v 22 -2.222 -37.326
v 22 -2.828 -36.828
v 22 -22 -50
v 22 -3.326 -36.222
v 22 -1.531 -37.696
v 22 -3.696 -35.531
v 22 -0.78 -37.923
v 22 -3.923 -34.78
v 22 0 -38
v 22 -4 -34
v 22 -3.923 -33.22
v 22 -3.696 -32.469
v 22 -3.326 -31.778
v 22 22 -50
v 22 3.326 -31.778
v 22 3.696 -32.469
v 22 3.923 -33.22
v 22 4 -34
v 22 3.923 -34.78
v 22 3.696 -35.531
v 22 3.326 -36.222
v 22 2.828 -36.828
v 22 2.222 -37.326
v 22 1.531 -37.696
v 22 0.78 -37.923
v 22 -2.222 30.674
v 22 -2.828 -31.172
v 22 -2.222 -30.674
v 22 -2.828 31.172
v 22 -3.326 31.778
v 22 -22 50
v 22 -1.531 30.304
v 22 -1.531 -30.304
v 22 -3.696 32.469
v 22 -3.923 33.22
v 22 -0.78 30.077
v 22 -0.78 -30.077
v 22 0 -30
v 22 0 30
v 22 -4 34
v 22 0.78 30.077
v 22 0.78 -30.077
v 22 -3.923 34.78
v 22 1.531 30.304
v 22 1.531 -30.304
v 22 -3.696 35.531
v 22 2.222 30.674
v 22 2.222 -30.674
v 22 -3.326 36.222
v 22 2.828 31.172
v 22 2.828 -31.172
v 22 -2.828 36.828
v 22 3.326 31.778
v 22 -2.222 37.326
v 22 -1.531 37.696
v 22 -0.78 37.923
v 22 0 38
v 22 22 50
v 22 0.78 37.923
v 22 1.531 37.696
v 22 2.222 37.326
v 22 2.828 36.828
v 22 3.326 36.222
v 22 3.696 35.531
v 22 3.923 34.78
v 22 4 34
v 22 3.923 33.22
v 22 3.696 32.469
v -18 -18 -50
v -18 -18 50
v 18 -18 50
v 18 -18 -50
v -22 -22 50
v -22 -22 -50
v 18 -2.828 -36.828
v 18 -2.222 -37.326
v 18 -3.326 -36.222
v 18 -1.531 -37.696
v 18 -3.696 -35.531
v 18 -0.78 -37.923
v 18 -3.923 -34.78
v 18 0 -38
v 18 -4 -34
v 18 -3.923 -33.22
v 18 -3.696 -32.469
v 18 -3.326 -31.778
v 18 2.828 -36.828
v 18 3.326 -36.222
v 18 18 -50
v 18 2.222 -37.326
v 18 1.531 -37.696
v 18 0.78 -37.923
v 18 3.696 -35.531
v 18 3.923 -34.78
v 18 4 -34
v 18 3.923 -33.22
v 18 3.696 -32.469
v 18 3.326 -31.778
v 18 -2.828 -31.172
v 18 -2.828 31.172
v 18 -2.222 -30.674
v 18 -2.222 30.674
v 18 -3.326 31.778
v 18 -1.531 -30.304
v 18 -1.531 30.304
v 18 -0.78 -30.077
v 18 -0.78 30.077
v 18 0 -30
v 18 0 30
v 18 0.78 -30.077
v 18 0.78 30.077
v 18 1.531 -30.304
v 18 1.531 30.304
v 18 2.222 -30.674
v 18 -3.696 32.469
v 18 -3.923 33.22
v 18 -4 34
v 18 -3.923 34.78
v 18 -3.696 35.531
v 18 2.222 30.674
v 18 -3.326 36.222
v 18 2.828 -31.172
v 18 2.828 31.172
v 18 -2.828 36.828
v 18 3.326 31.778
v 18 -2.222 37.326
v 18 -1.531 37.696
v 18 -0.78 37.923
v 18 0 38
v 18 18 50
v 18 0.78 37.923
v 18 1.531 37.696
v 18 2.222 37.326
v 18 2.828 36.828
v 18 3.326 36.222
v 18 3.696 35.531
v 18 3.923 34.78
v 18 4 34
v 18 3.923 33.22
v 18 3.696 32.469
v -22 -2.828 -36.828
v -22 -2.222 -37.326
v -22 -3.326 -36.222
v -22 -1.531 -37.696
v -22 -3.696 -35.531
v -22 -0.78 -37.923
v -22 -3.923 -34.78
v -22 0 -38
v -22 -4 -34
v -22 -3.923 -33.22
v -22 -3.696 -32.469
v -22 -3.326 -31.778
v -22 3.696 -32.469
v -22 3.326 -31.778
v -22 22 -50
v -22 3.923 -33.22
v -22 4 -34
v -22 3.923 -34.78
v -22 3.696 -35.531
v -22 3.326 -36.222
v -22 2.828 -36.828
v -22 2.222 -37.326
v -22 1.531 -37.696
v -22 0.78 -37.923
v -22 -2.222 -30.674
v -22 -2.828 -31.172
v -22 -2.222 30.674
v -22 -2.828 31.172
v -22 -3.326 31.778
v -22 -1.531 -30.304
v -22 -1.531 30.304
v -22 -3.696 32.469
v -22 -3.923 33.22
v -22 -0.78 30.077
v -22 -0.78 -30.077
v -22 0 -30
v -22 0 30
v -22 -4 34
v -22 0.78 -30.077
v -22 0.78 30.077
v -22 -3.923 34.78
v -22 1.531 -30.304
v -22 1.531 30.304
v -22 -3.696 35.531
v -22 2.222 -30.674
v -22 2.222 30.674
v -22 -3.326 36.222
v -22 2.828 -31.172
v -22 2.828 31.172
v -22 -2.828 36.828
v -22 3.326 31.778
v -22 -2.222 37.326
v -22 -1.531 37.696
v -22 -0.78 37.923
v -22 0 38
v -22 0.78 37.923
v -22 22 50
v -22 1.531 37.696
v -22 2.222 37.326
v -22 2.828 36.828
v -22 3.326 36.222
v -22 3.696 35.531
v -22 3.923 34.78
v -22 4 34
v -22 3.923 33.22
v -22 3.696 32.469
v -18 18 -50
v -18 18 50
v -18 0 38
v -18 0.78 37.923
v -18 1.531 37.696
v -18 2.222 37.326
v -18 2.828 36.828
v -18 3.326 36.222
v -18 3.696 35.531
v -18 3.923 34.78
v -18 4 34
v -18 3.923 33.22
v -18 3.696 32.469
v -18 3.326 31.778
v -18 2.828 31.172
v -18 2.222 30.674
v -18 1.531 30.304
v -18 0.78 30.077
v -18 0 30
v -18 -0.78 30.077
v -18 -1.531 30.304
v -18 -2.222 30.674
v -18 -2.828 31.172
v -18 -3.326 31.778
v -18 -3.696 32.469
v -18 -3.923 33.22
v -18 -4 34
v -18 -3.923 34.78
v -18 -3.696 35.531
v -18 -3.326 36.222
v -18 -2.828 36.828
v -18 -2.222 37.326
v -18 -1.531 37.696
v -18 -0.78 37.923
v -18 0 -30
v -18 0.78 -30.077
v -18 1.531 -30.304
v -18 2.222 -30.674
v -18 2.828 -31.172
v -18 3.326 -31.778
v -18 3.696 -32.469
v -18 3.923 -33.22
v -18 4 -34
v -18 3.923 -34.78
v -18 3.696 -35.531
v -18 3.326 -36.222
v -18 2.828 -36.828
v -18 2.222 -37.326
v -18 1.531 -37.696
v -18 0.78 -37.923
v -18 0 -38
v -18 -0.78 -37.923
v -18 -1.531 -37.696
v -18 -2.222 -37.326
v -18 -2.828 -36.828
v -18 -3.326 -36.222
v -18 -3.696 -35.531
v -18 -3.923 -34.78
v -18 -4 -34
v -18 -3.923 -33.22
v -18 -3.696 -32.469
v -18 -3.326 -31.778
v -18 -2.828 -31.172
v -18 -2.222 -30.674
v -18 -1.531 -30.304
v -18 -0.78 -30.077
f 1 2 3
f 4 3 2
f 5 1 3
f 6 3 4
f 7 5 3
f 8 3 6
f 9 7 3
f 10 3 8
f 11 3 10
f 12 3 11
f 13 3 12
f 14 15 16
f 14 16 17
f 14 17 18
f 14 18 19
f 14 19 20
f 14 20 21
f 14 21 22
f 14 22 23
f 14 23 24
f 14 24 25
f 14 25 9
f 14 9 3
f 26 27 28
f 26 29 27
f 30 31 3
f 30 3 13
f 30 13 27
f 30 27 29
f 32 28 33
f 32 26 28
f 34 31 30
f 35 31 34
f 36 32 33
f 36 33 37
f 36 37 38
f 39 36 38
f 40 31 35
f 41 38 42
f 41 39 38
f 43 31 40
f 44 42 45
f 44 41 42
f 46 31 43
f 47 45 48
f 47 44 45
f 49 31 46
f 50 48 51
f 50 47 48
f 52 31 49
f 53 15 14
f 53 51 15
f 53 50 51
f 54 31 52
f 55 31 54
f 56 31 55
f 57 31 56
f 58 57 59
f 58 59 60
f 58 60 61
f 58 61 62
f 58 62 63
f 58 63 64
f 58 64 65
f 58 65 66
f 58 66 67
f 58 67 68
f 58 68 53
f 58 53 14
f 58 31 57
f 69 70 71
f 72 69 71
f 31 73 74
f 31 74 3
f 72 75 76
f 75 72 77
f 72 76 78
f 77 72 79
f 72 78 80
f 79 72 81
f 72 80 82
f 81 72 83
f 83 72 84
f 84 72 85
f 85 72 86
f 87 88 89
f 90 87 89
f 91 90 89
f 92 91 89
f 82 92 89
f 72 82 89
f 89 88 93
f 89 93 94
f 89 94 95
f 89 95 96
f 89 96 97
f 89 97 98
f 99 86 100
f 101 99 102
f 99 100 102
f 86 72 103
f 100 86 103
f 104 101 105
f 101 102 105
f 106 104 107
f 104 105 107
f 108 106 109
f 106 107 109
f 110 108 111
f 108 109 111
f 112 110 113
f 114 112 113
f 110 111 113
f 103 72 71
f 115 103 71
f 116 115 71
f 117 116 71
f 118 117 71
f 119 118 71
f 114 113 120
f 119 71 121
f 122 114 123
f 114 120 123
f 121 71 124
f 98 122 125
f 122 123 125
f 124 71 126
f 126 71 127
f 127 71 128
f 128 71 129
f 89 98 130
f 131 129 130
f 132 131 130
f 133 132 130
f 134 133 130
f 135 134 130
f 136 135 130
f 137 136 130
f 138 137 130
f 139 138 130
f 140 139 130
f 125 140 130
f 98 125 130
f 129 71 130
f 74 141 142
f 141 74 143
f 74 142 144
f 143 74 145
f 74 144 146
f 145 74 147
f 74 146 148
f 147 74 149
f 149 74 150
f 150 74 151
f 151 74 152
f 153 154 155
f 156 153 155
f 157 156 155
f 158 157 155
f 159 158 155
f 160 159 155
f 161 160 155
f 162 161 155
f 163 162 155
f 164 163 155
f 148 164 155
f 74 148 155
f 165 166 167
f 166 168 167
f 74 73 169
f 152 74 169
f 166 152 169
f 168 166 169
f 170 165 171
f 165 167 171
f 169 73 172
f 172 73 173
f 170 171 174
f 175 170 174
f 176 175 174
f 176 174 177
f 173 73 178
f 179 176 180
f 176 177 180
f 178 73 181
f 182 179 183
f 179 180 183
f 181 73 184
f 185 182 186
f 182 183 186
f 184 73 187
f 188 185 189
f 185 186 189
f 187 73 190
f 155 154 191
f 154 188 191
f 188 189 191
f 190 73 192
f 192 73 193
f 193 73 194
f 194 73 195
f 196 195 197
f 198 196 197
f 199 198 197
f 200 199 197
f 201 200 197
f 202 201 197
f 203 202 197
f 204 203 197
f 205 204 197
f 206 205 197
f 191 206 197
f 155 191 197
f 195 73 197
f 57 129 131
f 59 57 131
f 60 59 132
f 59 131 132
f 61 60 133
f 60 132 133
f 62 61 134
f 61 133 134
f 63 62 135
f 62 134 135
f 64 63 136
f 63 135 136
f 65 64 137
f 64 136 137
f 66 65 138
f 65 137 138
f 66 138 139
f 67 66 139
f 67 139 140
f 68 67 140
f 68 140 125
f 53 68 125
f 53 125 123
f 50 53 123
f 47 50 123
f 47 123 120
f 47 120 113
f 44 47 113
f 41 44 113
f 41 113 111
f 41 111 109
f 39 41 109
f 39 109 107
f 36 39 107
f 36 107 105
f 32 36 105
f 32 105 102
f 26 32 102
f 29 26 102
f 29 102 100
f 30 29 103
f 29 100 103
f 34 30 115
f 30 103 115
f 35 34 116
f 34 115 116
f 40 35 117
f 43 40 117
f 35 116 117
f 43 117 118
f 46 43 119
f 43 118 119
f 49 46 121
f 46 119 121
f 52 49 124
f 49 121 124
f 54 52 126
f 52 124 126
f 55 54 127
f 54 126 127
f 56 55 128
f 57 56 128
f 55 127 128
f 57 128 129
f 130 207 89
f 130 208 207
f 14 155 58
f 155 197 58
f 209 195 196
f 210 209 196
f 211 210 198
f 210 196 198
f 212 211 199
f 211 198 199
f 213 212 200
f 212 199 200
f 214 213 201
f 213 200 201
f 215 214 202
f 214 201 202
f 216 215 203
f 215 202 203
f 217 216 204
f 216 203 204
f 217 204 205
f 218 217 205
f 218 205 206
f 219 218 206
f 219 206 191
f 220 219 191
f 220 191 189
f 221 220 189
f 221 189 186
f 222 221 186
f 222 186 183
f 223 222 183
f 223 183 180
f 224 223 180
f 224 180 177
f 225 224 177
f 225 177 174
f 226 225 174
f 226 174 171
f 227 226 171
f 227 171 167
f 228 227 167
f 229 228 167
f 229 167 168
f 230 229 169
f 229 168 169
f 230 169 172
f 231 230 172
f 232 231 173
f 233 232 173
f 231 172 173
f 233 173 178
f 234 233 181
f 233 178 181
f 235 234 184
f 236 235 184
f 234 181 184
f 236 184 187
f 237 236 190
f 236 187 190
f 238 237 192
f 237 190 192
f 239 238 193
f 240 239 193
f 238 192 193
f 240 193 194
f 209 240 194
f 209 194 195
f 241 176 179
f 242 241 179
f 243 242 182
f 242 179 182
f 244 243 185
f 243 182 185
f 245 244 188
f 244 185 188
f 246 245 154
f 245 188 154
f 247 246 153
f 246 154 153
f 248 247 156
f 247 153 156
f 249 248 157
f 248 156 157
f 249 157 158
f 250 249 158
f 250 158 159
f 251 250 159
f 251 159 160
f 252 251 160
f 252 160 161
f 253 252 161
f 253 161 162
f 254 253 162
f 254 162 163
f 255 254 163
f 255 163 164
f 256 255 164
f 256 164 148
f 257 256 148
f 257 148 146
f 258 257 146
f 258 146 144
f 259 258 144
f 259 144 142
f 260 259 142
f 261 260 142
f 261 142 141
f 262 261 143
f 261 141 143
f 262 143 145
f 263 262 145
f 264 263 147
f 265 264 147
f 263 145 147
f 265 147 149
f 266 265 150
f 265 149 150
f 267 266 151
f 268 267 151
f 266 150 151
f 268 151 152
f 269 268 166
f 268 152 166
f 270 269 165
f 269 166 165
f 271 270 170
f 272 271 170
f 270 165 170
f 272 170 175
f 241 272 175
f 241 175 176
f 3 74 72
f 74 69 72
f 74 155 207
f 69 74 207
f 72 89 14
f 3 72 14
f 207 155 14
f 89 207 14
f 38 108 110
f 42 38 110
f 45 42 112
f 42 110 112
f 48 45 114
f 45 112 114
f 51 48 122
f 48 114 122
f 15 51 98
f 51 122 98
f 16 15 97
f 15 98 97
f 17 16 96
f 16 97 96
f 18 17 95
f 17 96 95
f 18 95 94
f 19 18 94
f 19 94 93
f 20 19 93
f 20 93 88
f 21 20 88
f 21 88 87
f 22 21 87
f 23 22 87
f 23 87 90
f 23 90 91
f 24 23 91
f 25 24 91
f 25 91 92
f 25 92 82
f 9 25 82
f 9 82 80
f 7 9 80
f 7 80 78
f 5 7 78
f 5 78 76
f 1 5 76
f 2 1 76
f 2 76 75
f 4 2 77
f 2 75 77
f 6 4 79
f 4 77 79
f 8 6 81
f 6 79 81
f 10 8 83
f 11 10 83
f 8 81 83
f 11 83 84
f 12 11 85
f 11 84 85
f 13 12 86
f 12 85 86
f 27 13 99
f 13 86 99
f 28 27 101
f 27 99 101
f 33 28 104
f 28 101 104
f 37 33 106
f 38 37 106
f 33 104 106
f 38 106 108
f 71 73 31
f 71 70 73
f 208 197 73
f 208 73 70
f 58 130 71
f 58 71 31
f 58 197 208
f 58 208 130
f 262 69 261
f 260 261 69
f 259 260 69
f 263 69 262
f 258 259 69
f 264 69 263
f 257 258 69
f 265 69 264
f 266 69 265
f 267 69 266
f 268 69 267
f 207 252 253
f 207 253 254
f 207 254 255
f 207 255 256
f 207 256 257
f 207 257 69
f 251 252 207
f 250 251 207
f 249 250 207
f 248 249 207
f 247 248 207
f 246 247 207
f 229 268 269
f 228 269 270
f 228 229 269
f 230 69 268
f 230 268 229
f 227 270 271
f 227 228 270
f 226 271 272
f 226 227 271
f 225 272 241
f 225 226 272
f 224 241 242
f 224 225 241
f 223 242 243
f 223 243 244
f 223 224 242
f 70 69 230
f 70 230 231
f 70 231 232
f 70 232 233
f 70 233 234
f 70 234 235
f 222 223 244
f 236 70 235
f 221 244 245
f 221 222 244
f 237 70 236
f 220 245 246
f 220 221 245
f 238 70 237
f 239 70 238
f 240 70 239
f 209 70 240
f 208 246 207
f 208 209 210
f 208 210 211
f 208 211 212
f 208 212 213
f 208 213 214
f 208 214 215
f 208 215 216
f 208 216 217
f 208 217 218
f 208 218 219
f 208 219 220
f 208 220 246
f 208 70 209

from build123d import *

# Parameters (mm, degrees)
SKETCH1_W           = 44
SKETCH1_H           = 44
SKETCH1_W_2         = 36
SKETCH1_H_2         = 36
EXTRUDE_THIN1_DEPTH = 50
SKETCH2_R           = 4
CUT_EXTRUDE1_DEPTH  = 45


with BuildPart() as part:
    # Sketch1 → Extrude-Thin1 (new body, symmetric)
    with BuildSketch(Plane.XY):
        Rectangle(SKETCH1_W, SKETCH1_H)
        Rectangle(SKETCH1_W_2, SKETCH1_H_2, mode=Mode.SUBTRACT)
    extrude(amount=EXTRUDE_THIN1_DEPTH, both=True)

    # Sketch2 → Cut-Extrude1 (cut, through all)
    with BuildSketch(Plane.ZY.offset(22)):
        with Locations((34, 0)):
            Circle(SKETCH2_R)
        with Locations((-34, 0)):
            Circle(SKETCH2_R)
    extrude(amount=-CUT_EXTRUDE1_DEPTH, mode=Mode.SUBTRACT)


solid = part.part
